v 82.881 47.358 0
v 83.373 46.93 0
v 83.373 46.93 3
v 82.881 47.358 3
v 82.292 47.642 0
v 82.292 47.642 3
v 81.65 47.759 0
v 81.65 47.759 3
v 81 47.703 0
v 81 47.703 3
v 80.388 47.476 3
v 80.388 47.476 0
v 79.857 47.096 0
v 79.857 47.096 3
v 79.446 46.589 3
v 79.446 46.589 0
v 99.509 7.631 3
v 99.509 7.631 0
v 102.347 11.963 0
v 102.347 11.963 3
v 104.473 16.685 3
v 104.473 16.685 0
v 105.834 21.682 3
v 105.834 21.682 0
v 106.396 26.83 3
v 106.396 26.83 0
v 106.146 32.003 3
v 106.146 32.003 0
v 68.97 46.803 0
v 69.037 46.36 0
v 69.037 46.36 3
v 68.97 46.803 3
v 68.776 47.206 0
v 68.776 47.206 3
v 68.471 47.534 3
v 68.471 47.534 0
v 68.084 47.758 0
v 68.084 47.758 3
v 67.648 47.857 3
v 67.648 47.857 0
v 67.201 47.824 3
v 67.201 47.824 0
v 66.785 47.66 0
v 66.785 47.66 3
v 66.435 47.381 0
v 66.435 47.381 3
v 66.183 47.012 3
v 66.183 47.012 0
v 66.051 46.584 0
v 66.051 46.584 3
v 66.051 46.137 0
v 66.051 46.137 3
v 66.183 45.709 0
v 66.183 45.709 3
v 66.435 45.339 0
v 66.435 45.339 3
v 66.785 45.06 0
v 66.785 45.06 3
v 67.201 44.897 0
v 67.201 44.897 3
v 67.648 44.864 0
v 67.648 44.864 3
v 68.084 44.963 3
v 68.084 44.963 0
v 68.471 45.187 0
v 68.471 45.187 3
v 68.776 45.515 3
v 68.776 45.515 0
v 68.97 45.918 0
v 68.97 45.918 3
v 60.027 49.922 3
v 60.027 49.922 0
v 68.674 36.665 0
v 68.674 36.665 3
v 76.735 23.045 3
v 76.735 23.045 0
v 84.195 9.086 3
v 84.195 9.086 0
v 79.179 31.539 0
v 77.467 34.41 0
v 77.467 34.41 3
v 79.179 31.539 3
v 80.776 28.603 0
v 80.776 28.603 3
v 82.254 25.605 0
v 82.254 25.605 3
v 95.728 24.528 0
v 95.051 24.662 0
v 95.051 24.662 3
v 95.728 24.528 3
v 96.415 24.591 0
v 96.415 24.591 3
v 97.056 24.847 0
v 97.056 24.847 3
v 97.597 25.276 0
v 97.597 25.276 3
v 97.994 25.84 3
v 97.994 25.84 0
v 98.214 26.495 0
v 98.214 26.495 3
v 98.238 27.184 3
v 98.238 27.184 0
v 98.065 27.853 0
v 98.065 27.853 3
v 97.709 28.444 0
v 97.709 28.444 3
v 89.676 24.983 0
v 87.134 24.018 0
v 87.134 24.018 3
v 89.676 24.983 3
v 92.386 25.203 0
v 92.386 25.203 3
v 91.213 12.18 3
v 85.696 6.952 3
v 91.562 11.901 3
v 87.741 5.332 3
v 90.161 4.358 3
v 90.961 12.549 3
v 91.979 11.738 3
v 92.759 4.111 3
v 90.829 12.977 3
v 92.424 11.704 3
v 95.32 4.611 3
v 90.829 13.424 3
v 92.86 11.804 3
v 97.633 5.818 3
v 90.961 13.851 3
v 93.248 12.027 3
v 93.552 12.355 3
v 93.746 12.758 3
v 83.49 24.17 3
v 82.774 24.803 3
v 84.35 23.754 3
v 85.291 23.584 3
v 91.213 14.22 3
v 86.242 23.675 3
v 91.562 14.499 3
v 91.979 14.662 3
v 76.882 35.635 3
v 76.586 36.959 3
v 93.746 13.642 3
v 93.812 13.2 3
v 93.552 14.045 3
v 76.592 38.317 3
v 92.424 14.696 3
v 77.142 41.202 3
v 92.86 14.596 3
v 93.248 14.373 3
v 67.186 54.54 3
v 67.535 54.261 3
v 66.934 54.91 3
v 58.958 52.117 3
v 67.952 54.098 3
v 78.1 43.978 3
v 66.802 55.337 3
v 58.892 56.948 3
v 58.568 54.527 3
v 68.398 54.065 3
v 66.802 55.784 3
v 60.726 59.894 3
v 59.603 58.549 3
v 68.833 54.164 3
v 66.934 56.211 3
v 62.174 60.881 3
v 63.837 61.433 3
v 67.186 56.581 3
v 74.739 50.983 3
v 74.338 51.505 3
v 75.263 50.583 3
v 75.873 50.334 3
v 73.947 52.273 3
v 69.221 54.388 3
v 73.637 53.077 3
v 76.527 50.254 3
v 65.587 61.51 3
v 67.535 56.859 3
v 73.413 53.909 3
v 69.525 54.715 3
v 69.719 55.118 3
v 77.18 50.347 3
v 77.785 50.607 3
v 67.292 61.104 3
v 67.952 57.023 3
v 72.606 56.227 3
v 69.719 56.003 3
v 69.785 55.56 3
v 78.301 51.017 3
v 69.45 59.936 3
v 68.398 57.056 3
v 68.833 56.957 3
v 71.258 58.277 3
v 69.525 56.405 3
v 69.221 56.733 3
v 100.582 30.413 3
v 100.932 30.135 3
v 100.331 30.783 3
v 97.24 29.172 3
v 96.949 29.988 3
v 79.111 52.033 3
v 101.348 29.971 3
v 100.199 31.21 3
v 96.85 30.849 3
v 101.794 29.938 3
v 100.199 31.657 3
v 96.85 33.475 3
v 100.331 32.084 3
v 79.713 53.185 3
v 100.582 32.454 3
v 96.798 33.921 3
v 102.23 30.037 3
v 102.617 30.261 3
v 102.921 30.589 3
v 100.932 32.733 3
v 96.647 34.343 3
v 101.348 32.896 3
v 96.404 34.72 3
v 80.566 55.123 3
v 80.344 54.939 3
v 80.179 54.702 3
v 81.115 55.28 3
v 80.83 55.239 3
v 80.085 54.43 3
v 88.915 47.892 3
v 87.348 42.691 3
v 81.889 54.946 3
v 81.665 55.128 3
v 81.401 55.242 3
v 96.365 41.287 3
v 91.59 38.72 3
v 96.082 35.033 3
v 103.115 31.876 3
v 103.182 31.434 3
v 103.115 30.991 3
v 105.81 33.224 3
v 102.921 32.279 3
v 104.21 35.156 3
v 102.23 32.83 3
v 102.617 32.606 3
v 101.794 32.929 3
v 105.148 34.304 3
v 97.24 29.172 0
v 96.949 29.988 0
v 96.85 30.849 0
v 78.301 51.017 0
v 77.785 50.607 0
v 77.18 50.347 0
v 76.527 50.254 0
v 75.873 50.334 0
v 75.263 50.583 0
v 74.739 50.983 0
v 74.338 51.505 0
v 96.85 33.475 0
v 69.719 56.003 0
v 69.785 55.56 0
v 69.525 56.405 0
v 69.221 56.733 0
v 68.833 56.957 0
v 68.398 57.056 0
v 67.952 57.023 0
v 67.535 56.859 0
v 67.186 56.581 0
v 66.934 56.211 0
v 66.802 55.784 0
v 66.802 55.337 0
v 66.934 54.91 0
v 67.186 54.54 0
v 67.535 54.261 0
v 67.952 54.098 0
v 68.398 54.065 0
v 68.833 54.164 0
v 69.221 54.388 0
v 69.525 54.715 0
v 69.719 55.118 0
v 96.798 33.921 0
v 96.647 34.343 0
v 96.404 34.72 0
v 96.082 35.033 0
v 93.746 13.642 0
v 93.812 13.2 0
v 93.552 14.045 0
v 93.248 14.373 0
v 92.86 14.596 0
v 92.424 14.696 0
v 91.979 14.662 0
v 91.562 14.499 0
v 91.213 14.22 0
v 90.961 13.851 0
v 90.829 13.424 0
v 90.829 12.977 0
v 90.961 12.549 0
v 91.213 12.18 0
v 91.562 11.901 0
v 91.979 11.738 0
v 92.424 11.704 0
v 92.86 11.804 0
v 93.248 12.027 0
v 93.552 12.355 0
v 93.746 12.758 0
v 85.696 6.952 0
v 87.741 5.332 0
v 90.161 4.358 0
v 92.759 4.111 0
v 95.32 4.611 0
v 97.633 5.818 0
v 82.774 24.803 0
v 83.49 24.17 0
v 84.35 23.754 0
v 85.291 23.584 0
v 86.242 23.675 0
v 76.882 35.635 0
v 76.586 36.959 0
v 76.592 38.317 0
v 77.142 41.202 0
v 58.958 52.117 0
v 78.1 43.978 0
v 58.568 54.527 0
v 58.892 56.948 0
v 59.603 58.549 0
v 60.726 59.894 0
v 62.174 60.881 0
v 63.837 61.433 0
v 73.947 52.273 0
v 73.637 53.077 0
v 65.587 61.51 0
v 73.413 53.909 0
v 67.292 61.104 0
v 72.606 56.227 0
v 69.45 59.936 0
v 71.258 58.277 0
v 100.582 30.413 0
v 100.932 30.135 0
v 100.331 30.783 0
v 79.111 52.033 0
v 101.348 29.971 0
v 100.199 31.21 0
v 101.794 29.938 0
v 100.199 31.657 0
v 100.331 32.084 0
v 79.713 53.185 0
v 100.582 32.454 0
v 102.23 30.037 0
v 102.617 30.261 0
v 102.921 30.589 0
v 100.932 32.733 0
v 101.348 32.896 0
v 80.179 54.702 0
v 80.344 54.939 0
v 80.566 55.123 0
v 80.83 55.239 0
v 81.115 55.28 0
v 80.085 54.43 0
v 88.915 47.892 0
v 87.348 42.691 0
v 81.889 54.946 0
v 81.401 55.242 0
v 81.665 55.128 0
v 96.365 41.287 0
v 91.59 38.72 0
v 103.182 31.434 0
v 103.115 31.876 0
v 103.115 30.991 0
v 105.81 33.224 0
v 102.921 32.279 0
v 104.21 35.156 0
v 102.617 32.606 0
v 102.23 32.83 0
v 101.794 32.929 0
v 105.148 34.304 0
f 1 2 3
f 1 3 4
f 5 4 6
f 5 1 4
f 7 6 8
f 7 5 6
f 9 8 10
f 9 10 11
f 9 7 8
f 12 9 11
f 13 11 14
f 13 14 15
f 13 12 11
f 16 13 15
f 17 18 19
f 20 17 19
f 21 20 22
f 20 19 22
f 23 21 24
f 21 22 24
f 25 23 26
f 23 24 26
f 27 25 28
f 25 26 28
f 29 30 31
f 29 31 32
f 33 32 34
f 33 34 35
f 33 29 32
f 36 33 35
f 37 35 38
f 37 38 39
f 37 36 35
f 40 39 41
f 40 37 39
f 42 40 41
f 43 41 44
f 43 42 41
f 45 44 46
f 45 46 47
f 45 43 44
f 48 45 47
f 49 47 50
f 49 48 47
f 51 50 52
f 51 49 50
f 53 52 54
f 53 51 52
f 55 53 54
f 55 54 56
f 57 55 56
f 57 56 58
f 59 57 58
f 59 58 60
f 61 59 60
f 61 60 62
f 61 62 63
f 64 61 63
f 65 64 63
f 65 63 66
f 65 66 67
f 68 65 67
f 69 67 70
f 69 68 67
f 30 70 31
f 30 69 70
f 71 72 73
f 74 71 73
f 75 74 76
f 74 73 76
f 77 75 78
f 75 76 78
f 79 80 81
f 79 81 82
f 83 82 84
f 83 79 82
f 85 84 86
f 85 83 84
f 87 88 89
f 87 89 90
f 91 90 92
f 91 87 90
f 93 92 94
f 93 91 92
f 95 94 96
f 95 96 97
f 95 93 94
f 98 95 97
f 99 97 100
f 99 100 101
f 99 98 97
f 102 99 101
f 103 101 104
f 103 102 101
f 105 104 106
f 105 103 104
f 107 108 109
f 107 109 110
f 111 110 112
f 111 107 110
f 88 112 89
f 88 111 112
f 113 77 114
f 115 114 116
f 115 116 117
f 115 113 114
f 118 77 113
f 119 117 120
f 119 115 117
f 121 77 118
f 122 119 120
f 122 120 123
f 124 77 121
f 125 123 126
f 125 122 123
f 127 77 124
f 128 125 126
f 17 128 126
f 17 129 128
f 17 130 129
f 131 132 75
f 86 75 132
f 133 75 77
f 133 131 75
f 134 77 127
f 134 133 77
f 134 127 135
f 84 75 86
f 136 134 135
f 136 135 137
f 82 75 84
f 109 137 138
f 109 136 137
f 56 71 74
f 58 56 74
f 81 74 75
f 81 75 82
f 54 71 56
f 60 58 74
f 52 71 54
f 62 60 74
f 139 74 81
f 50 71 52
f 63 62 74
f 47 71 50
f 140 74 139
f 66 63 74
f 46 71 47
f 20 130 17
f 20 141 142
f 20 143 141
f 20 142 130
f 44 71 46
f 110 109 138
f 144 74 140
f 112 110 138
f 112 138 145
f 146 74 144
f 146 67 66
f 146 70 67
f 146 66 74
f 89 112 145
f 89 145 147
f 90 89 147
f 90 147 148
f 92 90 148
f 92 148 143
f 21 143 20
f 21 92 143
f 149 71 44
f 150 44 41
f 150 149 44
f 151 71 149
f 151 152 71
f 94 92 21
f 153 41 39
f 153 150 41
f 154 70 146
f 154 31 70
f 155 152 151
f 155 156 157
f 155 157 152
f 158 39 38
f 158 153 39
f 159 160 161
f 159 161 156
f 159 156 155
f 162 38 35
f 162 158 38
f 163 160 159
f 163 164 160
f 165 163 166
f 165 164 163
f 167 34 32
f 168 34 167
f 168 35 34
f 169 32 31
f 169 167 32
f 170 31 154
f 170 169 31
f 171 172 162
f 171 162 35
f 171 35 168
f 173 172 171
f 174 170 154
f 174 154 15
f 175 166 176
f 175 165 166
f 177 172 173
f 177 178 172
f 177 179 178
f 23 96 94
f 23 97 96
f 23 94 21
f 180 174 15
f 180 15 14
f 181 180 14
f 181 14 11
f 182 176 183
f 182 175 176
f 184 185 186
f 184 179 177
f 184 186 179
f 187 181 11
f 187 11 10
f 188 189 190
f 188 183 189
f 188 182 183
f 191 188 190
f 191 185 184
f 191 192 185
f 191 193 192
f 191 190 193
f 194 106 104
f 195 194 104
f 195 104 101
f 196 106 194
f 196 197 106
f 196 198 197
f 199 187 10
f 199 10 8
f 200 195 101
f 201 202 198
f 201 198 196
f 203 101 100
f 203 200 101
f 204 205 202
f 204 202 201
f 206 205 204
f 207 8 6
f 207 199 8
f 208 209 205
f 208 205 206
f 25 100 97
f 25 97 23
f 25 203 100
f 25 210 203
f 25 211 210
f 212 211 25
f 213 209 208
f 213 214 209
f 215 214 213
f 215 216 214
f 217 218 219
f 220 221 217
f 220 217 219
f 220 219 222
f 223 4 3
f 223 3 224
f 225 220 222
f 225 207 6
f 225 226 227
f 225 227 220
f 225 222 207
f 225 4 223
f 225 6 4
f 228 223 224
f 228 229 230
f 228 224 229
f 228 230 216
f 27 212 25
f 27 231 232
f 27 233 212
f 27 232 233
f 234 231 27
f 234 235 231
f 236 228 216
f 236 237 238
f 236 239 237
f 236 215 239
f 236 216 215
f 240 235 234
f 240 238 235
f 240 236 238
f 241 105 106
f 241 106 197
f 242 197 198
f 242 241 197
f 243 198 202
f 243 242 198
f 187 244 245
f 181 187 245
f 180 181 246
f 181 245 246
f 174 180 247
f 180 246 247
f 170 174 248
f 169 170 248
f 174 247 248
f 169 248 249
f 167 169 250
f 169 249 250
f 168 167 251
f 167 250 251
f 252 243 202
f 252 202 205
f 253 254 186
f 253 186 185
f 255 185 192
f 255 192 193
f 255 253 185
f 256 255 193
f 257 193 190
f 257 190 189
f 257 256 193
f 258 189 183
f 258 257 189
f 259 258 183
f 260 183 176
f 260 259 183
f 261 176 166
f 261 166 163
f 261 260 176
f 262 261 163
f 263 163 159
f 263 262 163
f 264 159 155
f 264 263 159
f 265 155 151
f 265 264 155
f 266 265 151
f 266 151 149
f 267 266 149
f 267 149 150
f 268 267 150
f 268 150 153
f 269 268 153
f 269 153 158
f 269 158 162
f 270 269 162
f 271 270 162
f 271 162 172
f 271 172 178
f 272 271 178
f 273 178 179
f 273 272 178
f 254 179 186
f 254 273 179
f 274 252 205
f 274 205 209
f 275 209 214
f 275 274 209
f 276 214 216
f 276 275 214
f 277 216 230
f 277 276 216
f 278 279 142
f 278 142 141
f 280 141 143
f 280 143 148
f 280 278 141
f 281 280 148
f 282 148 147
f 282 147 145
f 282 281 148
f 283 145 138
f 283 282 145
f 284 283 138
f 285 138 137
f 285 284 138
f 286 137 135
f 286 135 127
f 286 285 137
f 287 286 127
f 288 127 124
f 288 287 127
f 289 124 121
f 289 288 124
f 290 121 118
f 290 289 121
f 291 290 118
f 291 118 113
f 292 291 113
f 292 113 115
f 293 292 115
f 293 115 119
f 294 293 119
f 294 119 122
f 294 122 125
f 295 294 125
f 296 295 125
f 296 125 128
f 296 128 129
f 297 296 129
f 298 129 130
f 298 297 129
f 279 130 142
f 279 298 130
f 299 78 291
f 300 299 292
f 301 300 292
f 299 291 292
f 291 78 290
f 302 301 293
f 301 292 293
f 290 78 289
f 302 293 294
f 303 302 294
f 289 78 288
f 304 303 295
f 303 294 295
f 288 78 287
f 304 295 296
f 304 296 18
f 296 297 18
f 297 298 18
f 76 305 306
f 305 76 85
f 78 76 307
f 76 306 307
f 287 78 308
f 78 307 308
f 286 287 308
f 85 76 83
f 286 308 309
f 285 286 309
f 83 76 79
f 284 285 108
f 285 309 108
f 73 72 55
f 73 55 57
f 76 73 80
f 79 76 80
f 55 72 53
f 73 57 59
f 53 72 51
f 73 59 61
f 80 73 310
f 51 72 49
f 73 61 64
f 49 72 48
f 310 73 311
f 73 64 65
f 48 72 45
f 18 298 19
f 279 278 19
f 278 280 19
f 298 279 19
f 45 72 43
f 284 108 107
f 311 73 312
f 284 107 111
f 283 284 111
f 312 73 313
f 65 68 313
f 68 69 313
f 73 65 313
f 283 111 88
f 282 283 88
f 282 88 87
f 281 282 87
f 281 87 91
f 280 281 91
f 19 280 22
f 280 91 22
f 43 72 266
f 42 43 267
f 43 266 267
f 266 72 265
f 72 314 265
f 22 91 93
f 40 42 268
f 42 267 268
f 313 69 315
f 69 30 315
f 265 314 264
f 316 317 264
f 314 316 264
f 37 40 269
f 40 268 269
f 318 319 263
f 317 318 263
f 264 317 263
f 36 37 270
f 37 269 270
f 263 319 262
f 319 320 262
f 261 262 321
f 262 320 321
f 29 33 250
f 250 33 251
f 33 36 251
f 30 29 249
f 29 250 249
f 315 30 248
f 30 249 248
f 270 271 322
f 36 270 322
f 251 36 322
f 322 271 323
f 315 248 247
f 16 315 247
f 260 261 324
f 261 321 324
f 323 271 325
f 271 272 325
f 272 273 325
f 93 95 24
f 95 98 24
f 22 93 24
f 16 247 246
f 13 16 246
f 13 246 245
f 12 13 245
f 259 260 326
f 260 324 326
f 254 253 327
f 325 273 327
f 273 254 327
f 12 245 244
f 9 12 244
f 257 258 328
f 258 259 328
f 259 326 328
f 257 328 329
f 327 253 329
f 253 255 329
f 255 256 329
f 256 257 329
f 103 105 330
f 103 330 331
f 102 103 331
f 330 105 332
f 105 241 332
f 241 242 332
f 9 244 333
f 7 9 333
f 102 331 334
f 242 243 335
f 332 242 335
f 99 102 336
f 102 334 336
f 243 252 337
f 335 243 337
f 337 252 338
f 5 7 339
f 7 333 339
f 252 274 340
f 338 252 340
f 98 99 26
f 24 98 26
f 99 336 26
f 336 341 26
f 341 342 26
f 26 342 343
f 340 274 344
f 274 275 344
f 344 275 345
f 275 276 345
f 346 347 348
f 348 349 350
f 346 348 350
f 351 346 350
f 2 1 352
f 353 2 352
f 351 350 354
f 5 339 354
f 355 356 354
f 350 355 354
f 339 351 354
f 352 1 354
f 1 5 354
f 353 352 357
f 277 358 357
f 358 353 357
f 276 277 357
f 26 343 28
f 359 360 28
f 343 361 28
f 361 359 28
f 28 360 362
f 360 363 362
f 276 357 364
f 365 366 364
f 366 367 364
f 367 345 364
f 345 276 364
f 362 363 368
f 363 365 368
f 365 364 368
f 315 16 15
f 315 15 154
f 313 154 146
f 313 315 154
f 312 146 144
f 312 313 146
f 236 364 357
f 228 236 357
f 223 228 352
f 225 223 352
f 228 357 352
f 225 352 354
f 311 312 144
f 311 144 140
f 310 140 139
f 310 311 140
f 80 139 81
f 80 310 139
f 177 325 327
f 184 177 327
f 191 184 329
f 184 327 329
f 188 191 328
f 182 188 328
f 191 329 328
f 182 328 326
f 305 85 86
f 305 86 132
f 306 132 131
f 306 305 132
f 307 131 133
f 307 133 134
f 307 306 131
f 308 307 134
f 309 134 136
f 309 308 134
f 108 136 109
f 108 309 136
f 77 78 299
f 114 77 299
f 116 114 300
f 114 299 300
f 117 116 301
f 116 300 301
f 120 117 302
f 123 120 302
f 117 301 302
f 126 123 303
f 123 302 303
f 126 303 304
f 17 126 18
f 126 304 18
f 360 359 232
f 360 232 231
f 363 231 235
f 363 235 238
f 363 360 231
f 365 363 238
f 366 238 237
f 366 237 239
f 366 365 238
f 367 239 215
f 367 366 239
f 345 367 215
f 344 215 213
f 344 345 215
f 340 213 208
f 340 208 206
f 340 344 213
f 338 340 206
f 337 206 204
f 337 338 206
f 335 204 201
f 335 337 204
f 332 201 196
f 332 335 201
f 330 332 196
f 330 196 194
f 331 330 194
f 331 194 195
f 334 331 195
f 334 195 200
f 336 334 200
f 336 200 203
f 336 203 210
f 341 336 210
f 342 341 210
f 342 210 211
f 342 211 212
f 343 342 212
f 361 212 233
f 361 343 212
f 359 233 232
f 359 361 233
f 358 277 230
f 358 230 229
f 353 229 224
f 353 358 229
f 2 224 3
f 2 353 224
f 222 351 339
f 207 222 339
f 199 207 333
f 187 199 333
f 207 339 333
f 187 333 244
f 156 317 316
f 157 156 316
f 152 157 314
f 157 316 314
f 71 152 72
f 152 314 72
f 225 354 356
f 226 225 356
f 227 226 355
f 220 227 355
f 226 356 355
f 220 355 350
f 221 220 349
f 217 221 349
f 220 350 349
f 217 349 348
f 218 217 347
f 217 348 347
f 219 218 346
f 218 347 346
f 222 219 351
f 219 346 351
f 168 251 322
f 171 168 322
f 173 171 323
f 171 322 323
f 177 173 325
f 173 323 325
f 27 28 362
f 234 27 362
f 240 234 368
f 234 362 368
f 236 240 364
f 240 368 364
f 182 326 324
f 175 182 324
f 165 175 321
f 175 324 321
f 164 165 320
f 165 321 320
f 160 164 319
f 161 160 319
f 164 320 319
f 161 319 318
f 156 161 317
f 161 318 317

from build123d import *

# Parameters (mm, degrees)
ESQUISSE1_R        = 1.5
ESQUISSE1_R_2      = 1.50110642
BOSS_EXTRU_1_DEPTH = 3


with BuildPart() as part:
    # Esquisse1 → Boss.-Extru.1 (new body)
    with BuildSketch(Plane.XY):
        with BuildLine():
            ThreePointArc((60.026944648, 49.921558504), (72.778337749, 29.898863696), (84.195273994, 9.086369847))
            ThreePointArc((84.195273994, 9.086369847), (91.451273571, 4.140927091), (99.509067829, 7.630753106))
            ThreePointArc((99.509067829, 7.630753106), (105.251720368, 19.156706799), (106.145904128, 32.002955361))
            ThreePointArc((106.145904128, 32.002955361), (105.517176975, 33.787686969), (104.210334733, 35.15616353))
            ThreePointArc((104.210334733, 35.15616353), (92.58899703, 44.531440422), (81.889188019, 54.946112475))
            ThreePointArc((81.889188019, 54.946112475), (80.829609942, 55.239205413), (80.085451585, 54.429985101))
            ThreePointArc((80.085451585, 54.429985101), (79.43974416, 52.594599516), (78.30149473, 51.016636729))
            ThreePointArc((78.30149473, 51.016636729), (76.19777745, 50.272546762), (74.337717048, 51.505215238))
            ThreePointArc((74.337717048, 51.505215238), (73.781586954, 52.671085372), (73.412965229, 53.909088553))
            ThreePointArc((73.412965229, 53.909088553), (71.258227235, 58.277263879), (67.291581582, 61.103847288))
            ThreePointArc((67.291581582, 61.103847288), (62.173852637, 60.880940246), (58.891944342, 56.947758957))
            ThreePointArc((58.891944342, 56.947758957), (58.674610839, 53.307878055), (60.026944648, 49.921558504))
        make_face()
        with Locations((68.285467108, 55.560427953)):
            Circle(ESQUISSE1_R, mode=Mode.SUBTRACT)
        with Locations((101.682075096, 31.433543054)):
            Circle(ESQUISSE1_R, mode=Mode.SUBTRACT)
        with Locations((92.312371453, 13.200094295)):
            Circle(ESQUISSE1_R, mode=Mode.SUBTRACT)
        with Locations((67.535467108, 46.360427953)):
            Circle(ESQUISSE1_R_2, mode=Mode.SUBTRACT)
        with BuildLine():
            Line((96.849719723, 30.848999233), (96.849719723, 33.474650871))
            ThreePointArc((96.849719723, 33.474650871), (96.647309876, 34.343108764), (96.081794601, 35.032587793))
            ThreePointArc((96.081794601, 35.032587793), (89.436975045, 40.671042336), (83.372922141, 46.929880801))
            ThreePointArc((83.372922141, 46.929880801), (81.323140328, 47.752609653), (79.445810973, 46.588941858))
            ThreePointArc((79.445810973, 46.588941858), (77.571604785, 42.607109512), (76.591708968, 38.316720036))
            ThreePointArc((76.591708968, 38.316720036), (76.69683067, 36.288635677), (77.467153905, 34.409598995))
            ThreePointArc((77.467153905, 34.409598995), (79.992055499, 30.078906011), (82.254048976, 25.605270433))
            ThreePointArc((82.254048976, 25.605270433), (84.350090923, 23.753861276), (87.134236378, 24.017758597))
            ThreePointArc((87.134236378, 24.017758597), (91.023623533, 25.188476532), (95.051173024, 24.662398573))
            ThreePointArc((95.051173024, 24.662398573), (97.816197879, 25.543673578), (97.709238653, 28.443771474))
            ThreePointArc((97.709238653, 28.443771474), (97.07105369, 29.571903567), (96.849719723, 30.848999233))
        make_face(mode=Mode.SUBTRACT)
    extrude(amount=BOSS_EXTRU_1_DEPTH)


solid = part.part
